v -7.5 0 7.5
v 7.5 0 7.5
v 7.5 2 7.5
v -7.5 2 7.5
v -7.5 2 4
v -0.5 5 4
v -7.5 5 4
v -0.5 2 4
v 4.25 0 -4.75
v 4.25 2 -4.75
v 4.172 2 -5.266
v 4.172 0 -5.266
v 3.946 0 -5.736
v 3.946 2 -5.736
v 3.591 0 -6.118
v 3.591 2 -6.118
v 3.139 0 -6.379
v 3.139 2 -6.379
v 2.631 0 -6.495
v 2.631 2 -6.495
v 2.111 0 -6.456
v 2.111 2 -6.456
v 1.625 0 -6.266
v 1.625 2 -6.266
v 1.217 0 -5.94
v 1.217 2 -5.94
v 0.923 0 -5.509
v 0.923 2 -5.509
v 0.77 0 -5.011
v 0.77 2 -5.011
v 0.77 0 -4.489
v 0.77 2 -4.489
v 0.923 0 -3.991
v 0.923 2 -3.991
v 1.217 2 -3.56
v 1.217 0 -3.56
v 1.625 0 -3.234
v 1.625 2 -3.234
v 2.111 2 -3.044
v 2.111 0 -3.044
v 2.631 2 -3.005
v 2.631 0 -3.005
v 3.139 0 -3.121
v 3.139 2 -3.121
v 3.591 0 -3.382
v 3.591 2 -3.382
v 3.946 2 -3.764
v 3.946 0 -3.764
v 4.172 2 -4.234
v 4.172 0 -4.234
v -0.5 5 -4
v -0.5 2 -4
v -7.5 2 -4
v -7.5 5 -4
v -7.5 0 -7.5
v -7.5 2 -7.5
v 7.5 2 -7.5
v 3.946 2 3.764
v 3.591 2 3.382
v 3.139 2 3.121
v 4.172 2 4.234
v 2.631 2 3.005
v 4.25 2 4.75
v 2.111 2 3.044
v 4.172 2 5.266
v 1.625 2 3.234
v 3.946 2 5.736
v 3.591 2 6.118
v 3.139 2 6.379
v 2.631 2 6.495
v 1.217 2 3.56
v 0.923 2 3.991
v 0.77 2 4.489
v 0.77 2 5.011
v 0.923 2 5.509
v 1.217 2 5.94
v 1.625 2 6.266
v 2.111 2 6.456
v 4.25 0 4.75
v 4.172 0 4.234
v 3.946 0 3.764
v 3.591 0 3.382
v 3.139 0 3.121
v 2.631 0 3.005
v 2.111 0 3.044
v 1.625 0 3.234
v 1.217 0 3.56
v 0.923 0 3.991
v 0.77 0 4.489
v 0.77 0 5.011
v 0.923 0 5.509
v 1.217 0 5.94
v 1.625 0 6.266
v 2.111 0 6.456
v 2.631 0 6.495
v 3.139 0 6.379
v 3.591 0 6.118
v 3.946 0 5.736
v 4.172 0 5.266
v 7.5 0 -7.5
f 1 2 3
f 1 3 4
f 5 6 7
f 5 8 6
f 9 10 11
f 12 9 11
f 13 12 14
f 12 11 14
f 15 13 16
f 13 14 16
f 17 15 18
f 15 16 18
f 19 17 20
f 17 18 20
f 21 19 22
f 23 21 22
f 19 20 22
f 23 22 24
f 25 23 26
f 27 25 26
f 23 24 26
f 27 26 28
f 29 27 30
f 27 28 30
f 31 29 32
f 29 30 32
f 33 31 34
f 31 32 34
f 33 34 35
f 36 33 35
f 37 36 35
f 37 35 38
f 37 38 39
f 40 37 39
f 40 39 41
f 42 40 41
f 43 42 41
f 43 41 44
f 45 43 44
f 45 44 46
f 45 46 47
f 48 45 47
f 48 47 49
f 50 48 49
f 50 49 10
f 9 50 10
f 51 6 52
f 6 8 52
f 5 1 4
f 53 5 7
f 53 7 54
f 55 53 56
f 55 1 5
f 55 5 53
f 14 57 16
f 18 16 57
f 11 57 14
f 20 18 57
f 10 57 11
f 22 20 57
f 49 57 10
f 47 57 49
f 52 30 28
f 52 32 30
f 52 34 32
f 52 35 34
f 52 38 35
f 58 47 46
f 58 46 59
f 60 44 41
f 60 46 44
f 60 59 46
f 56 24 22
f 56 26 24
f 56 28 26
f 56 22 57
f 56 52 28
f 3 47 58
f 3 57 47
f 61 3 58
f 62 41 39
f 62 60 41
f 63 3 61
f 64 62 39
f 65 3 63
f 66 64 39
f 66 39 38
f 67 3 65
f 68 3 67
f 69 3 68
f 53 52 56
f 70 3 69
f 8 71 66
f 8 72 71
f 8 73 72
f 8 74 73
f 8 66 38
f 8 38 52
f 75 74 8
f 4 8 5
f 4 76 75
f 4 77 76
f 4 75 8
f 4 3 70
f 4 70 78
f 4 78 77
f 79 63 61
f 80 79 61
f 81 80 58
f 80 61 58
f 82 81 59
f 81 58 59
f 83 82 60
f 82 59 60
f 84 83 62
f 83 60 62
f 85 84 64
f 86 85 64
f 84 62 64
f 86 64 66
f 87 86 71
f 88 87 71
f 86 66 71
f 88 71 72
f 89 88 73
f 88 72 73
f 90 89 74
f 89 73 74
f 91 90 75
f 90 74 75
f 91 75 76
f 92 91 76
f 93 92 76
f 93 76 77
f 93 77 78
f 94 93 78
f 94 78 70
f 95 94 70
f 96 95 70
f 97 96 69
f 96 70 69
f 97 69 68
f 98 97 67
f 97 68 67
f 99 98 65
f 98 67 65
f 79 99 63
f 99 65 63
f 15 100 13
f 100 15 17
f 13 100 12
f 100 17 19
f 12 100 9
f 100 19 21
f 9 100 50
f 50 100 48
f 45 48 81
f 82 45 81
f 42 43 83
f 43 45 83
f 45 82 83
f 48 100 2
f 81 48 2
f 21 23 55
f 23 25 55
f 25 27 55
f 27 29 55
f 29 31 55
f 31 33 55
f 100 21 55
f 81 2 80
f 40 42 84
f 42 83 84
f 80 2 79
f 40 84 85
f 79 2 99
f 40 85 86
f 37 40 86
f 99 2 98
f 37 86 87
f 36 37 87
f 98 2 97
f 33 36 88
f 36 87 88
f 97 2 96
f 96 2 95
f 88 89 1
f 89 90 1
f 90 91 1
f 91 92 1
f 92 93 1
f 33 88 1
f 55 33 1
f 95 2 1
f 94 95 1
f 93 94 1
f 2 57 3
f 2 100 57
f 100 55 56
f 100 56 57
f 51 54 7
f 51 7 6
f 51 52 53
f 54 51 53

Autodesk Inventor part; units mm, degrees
ref_plane "YZ Plane" through (0, 0, 0) normal (1, 0, 0) x (0, 1, 0)
ref_plane "XZ Plane" through (0, 0, 0) normal (0, 1, 0) x (-1, 0, 0)
ref_plane "XY Plane" through (0, 0, 0) normal (0, 0, 1) x (1, 0, 0)
sketch "Sketch1" plane through (0, 0, 0) normal (0, 1, 0) x (-1, 0, 0)
  line L0 (-7.5, 7.5) -> (7.5, 7.5)
  line L1 (7.5, 7.5) -> (7.5, -7.5)
  line L2 (7.5, -7.5) -> (-7.5, -7.5)
  line L3 (-7.5, -7.5) -> (-7.5, 7.5)
  line L4 (-7.5, 7.5) -> (7.5, -7.5) construction
  line L5 (7.5, 7.5) -> (-7.5, -7.5) construction
  point P0 (0, 0)
  dimension "d0" = 15
  dimension "d1" = 15
extrude "Extrusion1" add sketch "Sketch1" along normal blind 2
sketch "Sketch2" plane through (0, 2, 0) normal (0, 1, 0) x (1, 0, 0)
  line L0 (7.5, 7.5) -> (-7.5, 7.5) construction
  line L1 (-7.5, 7.5) -> (-7.5, -7.5) construction
  line L2 (-7.5, -7.5) -> (7.5, -7.5) construction
  line L3 (7.5, -7.5) -> (7.5, 7.5) construction
  line L4 (-7.5, 7.5) -> (-7.5, -7.5) projected
  line L5 (-7.5, 0) -> (-0.5, 0)
  line L6 (-0.5, 0) -> (-0.5, 4)
  line L7 (-0.5, 4) -> (-7.5, 4)
  line L8 (-7.5, 4) -> (-7.5, 0)
  line L9 (-7.5, 0) -> (-0.5, 0) construction
  line L10 (-7.5, 0) -> (-0.5, 0)
  line L11 (-0.5, 0) -> (-0.5, -4)
  line L12 (-0.5, -4) -> (-7.5, -4)
  line L13 (-7.5, -4) -> (-7.5, 0)
  point P0 (0, 0)
  point P1 (-7.5, 4)
  dimension "d4" = 7
  dimension "d5" = 0
  dimension "d6" = 4
  dimension "d7" = 4
extrude "Extrusion2" add sketch "Sketch2" along normal blind 3
sketch "Sketch3" plane through (0, 2, 0) normal (0, 1, 0) x (1, 0, 0)
  line L0 (-0.5, 4) -> (-0.5, -4) construction
  line L1 (7.5, 7.5) -> (-7.5, 7.5) construction
  line L2 (7.5, 4.75) -> (2.5, 4.75) construction
  circle A0 centre (2.5, 4.75) radius 1.75
  line L3 (7.5, -7.5) -> (7.5, 7.5) construction
  line L4 (0, 0) -> (7.5, 0) construction
  line L5 (7.5, -7.5) -> (7.5, 7.5) construction
  circle A1 centre (2.5, -4.75) radius 1.75
  dimension "d10" = 5
  dimension "d11" = 3.5
  dimension "d12" = 2.75
extrude "Extrusion3" cut sketch "Sketch3" against normal through all
equation "\"d7\" = d6"
properties part number "Charger_Port"
